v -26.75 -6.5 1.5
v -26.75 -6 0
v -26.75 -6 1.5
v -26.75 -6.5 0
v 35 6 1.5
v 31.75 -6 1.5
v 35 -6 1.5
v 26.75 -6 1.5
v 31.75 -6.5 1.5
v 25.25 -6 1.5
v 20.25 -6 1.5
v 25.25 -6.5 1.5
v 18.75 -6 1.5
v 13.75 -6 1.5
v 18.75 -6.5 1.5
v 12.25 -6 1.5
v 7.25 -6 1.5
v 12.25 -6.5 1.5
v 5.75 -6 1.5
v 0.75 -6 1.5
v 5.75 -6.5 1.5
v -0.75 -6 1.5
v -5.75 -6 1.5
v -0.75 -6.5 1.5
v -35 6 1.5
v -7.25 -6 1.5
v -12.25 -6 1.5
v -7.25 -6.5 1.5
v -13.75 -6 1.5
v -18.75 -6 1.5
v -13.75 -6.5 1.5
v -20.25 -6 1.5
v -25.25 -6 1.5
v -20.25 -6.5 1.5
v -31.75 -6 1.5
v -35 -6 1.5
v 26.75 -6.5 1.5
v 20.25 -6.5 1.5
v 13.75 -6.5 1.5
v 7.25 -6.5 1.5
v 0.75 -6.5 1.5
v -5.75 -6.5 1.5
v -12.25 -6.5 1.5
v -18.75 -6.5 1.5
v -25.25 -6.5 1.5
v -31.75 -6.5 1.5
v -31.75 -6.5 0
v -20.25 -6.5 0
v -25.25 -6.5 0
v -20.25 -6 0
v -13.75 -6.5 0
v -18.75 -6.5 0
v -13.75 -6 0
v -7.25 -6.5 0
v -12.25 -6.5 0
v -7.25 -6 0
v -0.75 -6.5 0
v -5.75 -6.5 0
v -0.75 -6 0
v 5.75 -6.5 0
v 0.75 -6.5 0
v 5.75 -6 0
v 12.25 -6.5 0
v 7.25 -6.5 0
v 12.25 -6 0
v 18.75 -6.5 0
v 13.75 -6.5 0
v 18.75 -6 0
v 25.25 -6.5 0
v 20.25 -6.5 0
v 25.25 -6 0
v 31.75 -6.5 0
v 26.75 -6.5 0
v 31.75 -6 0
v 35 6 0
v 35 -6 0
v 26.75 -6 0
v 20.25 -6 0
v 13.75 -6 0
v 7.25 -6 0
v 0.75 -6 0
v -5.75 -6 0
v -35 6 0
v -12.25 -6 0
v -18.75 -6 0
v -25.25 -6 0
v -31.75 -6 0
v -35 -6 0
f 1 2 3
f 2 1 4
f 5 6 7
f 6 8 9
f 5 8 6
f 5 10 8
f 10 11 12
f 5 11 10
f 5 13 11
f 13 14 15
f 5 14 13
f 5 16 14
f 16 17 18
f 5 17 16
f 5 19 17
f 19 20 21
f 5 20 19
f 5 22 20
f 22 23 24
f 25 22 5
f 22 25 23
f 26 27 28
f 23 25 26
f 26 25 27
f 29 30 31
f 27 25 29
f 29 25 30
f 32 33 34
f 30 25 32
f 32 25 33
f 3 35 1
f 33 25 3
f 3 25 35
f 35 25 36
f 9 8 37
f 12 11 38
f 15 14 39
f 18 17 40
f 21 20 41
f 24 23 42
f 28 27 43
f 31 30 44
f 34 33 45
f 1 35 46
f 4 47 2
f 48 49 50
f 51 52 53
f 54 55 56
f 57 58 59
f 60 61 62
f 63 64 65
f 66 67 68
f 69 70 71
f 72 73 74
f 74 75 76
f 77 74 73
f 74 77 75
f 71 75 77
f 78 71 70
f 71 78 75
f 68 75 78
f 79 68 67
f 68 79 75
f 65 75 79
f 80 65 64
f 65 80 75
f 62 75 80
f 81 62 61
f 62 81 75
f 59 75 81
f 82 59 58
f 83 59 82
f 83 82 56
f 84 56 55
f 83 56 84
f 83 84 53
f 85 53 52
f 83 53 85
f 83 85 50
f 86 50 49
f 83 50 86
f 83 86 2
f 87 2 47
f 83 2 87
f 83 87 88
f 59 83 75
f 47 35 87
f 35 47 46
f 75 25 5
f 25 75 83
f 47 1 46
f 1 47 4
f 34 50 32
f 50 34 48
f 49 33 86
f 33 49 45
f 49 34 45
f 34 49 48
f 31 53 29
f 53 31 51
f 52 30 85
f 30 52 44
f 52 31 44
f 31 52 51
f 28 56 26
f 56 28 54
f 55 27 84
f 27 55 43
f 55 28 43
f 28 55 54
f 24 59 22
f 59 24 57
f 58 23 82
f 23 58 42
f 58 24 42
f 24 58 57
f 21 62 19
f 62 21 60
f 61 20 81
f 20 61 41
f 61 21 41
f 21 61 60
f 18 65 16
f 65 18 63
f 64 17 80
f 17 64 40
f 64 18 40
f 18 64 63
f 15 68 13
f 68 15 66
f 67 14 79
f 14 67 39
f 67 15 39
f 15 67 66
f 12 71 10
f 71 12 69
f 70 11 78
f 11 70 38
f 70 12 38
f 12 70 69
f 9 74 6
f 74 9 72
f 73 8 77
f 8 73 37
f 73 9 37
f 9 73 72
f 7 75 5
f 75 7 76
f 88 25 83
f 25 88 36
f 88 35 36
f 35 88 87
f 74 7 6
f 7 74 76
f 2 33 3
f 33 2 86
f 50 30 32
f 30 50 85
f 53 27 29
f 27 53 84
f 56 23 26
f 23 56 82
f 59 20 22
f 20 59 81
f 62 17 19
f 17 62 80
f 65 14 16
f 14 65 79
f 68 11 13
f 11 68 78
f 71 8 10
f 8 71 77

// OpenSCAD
// 10-well agarose gel casting comb
// Print orientation: flat on bed, teeth pointing down (-Y)

$fn = 64;

// ---- Dimensions (mm) ----
plate_t      = 1.5;   // plate thickness (Z)
spine_l      = 70;    // spine length (X)
spine_w      = 12;    // spine width (Y)
tooth_w      = 5.0;   // tooth width (X)
tooth_l      = 12;    // tooth length (Y)
tooth_count  = 10;    // number of teeth
gap          = 1.5;   // gap between teeth (X)
embed        = 0.5;   // tooth overlap into spine for a clean union

// ---- Derived ----
pitch   = tooth_w + gap;            // centre-to-centre spacing
x_start = -(tooth_count - 1) * pitch / 2;  // first tooth centre (row centred)

// ---- Model ----
union() {
    // Spine (back bar)
    translate([-spine_l / 2, -spine_w / 2, 0])
        cube([spine_l, spine_w, plate_t]);

    // Teeth hanging in -Y
    for (i = [0 : tooth_count - 1])
        translate([x_start + i * pitch - tooth_w / 2,
                   -spine_w / 2 - embed,
                   0])
            cube([tooth_w, tooth_l + embed, plate_t]);
}
